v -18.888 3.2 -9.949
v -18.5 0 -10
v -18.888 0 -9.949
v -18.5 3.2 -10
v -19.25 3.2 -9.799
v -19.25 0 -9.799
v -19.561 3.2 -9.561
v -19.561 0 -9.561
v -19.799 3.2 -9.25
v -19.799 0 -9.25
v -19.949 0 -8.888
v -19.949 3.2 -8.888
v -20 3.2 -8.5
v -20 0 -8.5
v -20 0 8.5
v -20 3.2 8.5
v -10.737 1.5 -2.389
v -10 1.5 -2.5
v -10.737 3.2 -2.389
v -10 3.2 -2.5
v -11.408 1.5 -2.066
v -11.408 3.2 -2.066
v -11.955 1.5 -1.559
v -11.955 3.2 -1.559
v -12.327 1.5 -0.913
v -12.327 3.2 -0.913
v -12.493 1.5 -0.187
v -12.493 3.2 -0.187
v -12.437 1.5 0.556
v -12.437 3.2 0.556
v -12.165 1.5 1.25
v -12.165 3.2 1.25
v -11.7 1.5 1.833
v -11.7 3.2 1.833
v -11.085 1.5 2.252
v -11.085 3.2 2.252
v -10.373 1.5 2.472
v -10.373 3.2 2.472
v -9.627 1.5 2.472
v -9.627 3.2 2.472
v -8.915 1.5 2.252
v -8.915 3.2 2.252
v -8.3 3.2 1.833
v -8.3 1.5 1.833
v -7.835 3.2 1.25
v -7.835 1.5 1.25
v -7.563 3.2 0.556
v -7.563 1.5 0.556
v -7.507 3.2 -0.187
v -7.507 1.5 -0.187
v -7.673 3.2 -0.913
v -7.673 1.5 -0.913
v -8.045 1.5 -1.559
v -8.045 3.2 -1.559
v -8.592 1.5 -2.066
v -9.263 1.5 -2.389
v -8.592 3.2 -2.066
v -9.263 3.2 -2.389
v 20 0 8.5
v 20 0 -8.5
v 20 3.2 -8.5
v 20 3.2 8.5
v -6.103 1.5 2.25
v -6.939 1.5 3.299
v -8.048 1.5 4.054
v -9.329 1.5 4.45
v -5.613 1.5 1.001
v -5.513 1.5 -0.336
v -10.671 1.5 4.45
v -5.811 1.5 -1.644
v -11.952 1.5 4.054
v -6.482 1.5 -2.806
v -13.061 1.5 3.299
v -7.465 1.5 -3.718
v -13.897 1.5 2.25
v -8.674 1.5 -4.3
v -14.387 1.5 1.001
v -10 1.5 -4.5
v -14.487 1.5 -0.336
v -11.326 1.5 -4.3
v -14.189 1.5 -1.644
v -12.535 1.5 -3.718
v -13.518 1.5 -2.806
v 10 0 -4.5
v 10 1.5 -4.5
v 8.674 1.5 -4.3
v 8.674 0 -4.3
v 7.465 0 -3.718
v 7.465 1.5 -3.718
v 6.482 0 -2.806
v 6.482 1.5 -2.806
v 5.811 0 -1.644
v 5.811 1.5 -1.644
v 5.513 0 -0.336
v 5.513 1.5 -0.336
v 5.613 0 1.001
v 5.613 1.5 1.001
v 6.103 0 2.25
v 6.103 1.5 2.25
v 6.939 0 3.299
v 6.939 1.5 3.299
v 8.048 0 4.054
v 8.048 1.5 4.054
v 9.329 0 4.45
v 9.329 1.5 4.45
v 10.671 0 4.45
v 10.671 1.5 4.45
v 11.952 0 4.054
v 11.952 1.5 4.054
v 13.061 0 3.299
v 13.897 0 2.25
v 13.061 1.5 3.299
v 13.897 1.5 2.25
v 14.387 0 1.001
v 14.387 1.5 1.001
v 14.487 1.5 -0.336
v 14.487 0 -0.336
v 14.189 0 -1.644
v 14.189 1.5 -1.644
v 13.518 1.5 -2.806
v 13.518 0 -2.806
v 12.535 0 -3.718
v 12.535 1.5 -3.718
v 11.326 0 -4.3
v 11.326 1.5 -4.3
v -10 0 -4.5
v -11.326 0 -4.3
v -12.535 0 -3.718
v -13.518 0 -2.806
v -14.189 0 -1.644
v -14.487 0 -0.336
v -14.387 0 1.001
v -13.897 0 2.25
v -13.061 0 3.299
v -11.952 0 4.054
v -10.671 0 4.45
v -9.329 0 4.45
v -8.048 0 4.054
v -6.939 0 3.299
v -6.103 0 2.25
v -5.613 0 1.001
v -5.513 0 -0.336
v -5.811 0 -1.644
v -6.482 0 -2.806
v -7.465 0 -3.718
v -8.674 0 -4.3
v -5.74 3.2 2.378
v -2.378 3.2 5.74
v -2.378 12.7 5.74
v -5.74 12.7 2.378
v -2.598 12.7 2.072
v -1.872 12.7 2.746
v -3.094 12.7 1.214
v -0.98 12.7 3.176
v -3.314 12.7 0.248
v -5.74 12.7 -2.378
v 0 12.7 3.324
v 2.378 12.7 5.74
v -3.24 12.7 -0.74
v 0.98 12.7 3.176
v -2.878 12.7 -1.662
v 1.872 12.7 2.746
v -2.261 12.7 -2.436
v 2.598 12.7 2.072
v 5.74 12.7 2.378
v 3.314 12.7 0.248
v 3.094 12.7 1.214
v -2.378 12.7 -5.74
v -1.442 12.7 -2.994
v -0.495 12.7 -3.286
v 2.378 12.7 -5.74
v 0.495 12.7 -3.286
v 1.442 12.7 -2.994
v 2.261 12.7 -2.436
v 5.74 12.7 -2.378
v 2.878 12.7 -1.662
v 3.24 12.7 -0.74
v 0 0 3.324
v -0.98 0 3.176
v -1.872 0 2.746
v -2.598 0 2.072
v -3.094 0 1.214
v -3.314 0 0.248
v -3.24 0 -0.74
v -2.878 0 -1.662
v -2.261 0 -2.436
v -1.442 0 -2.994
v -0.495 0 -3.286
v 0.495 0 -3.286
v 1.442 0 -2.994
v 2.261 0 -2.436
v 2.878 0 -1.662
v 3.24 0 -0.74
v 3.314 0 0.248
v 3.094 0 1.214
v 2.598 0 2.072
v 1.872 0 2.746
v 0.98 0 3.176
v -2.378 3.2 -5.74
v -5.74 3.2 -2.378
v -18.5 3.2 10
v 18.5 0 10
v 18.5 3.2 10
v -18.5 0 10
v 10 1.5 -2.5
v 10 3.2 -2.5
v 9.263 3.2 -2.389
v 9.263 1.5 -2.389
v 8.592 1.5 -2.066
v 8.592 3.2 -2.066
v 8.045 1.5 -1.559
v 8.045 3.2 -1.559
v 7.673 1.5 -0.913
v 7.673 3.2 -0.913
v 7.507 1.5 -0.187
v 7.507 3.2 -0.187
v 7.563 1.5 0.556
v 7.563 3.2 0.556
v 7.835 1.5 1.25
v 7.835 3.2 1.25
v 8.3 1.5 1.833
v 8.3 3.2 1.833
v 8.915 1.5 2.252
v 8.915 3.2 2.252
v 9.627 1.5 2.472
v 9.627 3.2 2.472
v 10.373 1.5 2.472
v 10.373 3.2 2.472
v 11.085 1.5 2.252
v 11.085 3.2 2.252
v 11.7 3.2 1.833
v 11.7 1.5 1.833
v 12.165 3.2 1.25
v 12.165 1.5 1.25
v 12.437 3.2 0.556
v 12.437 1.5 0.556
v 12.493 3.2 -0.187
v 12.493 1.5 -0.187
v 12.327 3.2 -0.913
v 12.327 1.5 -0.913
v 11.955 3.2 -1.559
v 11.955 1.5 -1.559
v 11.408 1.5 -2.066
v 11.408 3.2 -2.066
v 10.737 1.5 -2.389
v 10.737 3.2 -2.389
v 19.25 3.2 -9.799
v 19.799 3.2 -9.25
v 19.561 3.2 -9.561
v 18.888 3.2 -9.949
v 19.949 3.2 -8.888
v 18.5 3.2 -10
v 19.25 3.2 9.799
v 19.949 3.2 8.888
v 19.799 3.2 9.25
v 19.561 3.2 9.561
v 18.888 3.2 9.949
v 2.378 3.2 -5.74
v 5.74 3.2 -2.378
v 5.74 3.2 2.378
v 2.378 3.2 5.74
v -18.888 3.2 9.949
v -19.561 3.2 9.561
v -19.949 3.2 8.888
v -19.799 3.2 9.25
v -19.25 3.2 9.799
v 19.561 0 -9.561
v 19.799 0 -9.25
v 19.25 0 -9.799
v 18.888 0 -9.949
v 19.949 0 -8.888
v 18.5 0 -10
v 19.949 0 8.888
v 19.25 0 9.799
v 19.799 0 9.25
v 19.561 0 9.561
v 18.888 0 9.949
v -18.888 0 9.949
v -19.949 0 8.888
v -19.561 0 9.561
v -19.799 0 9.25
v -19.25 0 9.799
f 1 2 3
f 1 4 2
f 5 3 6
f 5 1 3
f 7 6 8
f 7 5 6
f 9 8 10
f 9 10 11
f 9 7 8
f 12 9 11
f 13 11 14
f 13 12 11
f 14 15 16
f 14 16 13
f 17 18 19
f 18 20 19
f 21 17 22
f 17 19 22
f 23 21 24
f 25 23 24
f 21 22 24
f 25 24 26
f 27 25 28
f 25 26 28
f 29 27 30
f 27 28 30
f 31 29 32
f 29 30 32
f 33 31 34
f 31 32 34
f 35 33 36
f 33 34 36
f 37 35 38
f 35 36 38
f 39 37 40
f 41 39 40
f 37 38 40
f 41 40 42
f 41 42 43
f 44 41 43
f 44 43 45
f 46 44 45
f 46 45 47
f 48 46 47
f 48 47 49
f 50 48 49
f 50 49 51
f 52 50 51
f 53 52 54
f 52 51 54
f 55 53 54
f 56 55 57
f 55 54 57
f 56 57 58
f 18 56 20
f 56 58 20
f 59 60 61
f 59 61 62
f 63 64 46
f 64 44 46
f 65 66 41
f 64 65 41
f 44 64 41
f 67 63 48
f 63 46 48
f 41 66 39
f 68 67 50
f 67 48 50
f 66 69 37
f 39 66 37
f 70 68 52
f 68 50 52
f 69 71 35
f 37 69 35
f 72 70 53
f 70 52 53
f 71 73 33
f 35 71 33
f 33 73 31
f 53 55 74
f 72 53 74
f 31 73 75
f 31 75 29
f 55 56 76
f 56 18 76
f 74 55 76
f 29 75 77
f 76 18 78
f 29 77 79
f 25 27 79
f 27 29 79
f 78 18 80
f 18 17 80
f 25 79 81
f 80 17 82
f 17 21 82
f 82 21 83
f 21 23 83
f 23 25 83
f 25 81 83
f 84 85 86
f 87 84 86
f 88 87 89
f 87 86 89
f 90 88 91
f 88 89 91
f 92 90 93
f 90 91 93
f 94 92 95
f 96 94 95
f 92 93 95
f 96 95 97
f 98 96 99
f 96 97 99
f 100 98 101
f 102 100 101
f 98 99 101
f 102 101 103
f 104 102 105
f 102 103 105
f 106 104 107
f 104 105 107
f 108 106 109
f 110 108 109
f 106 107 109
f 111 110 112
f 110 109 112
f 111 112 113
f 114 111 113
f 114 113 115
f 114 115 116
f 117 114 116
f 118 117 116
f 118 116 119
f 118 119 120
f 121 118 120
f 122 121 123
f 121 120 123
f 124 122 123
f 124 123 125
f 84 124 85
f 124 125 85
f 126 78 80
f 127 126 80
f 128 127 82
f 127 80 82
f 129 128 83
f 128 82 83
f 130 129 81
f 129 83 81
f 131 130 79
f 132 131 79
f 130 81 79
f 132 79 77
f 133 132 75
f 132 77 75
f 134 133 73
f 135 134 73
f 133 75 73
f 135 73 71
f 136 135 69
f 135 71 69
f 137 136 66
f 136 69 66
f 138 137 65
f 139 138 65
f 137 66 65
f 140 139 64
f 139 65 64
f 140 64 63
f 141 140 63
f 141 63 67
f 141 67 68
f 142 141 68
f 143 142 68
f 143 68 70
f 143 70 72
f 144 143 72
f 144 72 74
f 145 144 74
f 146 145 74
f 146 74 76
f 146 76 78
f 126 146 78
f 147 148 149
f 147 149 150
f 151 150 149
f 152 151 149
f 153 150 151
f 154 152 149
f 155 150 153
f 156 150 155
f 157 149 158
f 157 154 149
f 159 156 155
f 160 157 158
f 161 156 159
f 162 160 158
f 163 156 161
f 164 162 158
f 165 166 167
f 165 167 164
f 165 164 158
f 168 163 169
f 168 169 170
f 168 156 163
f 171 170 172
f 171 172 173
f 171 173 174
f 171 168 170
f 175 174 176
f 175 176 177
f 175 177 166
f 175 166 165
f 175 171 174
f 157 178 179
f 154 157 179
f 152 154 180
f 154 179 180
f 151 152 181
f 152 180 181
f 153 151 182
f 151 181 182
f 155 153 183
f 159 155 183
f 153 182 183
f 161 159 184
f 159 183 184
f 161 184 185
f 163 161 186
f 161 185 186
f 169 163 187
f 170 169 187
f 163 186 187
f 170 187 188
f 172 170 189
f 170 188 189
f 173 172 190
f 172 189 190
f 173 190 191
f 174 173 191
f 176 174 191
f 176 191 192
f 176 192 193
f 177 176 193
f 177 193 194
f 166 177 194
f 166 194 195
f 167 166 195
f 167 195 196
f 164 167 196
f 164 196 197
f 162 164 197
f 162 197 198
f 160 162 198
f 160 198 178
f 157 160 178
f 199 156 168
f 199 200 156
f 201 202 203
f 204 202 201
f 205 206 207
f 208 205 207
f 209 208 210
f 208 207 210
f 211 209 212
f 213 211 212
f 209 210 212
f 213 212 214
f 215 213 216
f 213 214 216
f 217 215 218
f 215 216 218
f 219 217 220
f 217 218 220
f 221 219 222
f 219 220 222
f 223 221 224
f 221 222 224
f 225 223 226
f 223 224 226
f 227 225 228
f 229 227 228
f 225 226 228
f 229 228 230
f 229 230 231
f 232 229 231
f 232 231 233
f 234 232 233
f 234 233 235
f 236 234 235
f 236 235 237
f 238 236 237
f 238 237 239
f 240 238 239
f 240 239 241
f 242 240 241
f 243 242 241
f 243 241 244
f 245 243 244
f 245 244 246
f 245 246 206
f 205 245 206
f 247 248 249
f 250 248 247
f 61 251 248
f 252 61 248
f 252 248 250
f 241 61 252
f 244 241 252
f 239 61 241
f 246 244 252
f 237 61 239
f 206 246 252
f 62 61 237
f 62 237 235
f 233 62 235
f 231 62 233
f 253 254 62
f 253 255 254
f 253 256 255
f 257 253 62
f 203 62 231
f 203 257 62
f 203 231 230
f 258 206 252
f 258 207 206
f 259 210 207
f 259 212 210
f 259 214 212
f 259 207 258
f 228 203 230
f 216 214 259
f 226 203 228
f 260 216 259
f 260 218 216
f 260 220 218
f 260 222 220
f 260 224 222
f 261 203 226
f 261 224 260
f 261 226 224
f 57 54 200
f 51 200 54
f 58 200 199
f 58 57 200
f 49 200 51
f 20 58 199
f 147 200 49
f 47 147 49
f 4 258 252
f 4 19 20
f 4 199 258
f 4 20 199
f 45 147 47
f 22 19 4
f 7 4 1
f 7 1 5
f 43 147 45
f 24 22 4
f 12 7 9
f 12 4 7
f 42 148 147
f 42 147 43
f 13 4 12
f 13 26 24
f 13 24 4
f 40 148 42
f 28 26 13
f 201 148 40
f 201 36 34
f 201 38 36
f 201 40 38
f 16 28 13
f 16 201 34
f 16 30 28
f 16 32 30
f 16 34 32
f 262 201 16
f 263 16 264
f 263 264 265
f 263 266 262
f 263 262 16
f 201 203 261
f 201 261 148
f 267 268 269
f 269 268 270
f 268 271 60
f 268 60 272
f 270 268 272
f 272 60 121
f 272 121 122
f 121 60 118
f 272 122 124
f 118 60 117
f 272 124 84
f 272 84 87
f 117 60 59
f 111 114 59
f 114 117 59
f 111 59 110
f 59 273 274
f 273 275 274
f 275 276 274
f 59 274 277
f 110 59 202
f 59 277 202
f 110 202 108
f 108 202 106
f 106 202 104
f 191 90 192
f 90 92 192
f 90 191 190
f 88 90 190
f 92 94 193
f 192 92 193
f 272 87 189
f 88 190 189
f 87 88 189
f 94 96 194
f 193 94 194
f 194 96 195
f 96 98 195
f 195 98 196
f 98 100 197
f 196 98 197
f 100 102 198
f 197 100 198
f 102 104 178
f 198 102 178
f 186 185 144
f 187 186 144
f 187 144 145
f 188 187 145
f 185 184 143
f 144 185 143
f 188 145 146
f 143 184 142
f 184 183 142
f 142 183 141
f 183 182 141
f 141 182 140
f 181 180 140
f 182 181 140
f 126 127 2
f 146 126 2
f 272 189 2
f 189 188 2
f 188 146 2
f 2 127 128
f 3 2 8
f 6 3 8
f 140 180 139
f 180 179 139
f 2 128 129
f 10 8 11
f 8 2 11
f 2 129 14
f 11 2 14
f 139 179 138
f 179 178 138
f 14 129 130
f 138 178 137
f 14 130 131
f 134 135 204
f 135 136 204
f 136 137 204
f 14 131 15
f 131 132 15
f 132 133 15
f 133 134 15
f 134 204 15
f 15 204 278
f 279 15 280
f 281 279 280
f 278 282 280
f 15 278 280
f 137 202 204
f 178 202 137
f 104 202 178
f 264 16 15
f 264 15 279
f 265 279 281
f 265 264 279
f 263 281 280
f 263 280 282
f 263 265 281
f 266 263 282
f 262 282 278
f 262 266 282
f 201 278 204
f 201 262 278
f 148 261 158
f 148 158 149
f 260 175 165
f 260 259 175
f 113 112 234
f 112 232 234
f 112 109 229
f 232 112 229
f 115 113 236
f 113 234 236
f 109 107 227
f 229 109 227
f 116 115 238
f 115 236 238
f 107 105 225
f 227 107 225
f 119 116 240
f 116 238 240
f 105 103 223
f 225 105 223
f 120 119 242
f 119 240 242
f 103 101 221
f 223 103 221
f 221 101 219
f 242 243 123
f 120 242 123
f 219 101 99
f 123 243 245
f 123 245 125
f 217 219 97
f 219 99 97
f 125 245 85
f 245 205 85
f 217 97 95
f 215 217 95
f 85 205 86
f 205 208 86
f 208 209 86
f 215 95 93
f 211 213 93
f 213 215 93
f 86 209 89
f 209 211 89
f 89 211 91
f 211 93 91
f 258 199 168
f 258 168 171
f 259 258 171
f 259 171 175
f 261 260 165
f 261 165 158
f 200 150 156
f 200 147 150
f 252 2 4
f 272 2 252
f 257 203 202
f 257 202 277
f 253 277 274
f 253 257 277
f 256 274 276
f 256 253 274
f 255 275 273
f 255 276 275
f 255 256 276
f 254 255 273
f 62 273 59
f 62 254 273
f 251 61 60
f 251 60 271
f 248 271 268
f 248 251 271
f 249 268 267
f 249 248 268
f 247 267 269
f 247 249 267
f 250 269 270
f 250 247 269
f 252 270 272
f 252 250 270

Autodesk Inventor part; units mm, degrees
ref_plane "YZ Plane" through (0, 0, 0) normal (1, 0, 0) x (0, 1, 0)
ref_plane "XZ Plane" through (0, 0, 0) normal (0, 1, 0) x (-1, 0, 0)
ref_plane "XY Plane" through (0, 0, 0) normal (0, 0, 1) x (1, 0, 0)
sketch "Sketch1" plane through (0, 0, 0) normal (0, 1, 0) x (-1, 0, 0)
  line L0 (20, -10) -> (-20, -10)
  line L1 (-20, -10) -> (-20, 10)
  line L2 (-20, 10) -> (20, 10)
  line L3 (20, 10) -> (20, -10)
  line L4 (20, -10) -> (-20, 10) construction
  line L5 (-20, -10) -> (20, 10) construction
  point P0 (0, 0)
  dimension "d0" = 40
  dimension "d1" = 20
extrude "Extrusion1" add sketch "Sketch1" along normal blind 3.2
sketch "Sketch2" plane through (0, 0, 0) normal (0, -1, 0) x (1, 0, 0)
  line L0 (-20, -10) -> (20, -10) projected
  line L1 (-20, 10) -> (-20, -10) projected
  point P0 (0, 0)
  point P1 (-10, 0)
  point P2 (10, 0)
  dimension "d4" = 10
  dimension "d5" = 20
  dimension "d6" = 10
hole "Hole1" at (-10, 0, 0) at (10, 0, 0) direction (0, 1, 0) diameter 5 end through all counterbore diameter 9 counterbore depth 1.5
sketch "Sketch3" plane through (0, 3.2, 0) normal (0, 1, 0) x (1, 0, 0)
  line L0 (-20, -10) -> (20, -10) projected
  line L1 (2.3776, -5.74) -> (-2.3776, -5.74)
  line L2 (-2.3776, -5.74) -> (-5.74, -2.3776)
  line L3 (-5.74, -2.3776) -> (-5.74, 2.3776)
  line L4 (-5.74, 2.3776) -> (-2.3776, 5.74)
  line L5 (-2.3776, 5.74) -> (2.3776, 5.74)
  line L6 (2.3776, 5.74) -> (5.74, 2.3776)
  line L7 (5.74, 2.3776) -> (5.74, -2.3776)
  line L8 (5.74, -2.3776) -> (2.3776, -5.74)
  point P0 (0, 0)
  point P1 (0, 0)
  dimension "d14" = 11.48
extrude "Extrusion2" add sketch "Sketch3" along normal blind 9.5
sketch "Sketch4" plane through (0, 12.7, 0) normal (0, 1, 0) x (1, 0, 0)
  point P0 (0, 0)
  point P1 (0, 0)
hole "Hole2" at (0, 12.7, 0) direction (0, -1, 0) diameter 6.647 end through all thread size "M8x1.25" class "6H" standard "ANSI Metric M Profile"
fillet "Fillet1" radius 1.5 4 edges at (-20, 1.6, 10) (20, 1.6, 10) (20, 1.6, -10) (-20, 1.6, -10)
properties part number "Metric 8mm ACME Nut Plate" material "Acetal Resin, Black"
